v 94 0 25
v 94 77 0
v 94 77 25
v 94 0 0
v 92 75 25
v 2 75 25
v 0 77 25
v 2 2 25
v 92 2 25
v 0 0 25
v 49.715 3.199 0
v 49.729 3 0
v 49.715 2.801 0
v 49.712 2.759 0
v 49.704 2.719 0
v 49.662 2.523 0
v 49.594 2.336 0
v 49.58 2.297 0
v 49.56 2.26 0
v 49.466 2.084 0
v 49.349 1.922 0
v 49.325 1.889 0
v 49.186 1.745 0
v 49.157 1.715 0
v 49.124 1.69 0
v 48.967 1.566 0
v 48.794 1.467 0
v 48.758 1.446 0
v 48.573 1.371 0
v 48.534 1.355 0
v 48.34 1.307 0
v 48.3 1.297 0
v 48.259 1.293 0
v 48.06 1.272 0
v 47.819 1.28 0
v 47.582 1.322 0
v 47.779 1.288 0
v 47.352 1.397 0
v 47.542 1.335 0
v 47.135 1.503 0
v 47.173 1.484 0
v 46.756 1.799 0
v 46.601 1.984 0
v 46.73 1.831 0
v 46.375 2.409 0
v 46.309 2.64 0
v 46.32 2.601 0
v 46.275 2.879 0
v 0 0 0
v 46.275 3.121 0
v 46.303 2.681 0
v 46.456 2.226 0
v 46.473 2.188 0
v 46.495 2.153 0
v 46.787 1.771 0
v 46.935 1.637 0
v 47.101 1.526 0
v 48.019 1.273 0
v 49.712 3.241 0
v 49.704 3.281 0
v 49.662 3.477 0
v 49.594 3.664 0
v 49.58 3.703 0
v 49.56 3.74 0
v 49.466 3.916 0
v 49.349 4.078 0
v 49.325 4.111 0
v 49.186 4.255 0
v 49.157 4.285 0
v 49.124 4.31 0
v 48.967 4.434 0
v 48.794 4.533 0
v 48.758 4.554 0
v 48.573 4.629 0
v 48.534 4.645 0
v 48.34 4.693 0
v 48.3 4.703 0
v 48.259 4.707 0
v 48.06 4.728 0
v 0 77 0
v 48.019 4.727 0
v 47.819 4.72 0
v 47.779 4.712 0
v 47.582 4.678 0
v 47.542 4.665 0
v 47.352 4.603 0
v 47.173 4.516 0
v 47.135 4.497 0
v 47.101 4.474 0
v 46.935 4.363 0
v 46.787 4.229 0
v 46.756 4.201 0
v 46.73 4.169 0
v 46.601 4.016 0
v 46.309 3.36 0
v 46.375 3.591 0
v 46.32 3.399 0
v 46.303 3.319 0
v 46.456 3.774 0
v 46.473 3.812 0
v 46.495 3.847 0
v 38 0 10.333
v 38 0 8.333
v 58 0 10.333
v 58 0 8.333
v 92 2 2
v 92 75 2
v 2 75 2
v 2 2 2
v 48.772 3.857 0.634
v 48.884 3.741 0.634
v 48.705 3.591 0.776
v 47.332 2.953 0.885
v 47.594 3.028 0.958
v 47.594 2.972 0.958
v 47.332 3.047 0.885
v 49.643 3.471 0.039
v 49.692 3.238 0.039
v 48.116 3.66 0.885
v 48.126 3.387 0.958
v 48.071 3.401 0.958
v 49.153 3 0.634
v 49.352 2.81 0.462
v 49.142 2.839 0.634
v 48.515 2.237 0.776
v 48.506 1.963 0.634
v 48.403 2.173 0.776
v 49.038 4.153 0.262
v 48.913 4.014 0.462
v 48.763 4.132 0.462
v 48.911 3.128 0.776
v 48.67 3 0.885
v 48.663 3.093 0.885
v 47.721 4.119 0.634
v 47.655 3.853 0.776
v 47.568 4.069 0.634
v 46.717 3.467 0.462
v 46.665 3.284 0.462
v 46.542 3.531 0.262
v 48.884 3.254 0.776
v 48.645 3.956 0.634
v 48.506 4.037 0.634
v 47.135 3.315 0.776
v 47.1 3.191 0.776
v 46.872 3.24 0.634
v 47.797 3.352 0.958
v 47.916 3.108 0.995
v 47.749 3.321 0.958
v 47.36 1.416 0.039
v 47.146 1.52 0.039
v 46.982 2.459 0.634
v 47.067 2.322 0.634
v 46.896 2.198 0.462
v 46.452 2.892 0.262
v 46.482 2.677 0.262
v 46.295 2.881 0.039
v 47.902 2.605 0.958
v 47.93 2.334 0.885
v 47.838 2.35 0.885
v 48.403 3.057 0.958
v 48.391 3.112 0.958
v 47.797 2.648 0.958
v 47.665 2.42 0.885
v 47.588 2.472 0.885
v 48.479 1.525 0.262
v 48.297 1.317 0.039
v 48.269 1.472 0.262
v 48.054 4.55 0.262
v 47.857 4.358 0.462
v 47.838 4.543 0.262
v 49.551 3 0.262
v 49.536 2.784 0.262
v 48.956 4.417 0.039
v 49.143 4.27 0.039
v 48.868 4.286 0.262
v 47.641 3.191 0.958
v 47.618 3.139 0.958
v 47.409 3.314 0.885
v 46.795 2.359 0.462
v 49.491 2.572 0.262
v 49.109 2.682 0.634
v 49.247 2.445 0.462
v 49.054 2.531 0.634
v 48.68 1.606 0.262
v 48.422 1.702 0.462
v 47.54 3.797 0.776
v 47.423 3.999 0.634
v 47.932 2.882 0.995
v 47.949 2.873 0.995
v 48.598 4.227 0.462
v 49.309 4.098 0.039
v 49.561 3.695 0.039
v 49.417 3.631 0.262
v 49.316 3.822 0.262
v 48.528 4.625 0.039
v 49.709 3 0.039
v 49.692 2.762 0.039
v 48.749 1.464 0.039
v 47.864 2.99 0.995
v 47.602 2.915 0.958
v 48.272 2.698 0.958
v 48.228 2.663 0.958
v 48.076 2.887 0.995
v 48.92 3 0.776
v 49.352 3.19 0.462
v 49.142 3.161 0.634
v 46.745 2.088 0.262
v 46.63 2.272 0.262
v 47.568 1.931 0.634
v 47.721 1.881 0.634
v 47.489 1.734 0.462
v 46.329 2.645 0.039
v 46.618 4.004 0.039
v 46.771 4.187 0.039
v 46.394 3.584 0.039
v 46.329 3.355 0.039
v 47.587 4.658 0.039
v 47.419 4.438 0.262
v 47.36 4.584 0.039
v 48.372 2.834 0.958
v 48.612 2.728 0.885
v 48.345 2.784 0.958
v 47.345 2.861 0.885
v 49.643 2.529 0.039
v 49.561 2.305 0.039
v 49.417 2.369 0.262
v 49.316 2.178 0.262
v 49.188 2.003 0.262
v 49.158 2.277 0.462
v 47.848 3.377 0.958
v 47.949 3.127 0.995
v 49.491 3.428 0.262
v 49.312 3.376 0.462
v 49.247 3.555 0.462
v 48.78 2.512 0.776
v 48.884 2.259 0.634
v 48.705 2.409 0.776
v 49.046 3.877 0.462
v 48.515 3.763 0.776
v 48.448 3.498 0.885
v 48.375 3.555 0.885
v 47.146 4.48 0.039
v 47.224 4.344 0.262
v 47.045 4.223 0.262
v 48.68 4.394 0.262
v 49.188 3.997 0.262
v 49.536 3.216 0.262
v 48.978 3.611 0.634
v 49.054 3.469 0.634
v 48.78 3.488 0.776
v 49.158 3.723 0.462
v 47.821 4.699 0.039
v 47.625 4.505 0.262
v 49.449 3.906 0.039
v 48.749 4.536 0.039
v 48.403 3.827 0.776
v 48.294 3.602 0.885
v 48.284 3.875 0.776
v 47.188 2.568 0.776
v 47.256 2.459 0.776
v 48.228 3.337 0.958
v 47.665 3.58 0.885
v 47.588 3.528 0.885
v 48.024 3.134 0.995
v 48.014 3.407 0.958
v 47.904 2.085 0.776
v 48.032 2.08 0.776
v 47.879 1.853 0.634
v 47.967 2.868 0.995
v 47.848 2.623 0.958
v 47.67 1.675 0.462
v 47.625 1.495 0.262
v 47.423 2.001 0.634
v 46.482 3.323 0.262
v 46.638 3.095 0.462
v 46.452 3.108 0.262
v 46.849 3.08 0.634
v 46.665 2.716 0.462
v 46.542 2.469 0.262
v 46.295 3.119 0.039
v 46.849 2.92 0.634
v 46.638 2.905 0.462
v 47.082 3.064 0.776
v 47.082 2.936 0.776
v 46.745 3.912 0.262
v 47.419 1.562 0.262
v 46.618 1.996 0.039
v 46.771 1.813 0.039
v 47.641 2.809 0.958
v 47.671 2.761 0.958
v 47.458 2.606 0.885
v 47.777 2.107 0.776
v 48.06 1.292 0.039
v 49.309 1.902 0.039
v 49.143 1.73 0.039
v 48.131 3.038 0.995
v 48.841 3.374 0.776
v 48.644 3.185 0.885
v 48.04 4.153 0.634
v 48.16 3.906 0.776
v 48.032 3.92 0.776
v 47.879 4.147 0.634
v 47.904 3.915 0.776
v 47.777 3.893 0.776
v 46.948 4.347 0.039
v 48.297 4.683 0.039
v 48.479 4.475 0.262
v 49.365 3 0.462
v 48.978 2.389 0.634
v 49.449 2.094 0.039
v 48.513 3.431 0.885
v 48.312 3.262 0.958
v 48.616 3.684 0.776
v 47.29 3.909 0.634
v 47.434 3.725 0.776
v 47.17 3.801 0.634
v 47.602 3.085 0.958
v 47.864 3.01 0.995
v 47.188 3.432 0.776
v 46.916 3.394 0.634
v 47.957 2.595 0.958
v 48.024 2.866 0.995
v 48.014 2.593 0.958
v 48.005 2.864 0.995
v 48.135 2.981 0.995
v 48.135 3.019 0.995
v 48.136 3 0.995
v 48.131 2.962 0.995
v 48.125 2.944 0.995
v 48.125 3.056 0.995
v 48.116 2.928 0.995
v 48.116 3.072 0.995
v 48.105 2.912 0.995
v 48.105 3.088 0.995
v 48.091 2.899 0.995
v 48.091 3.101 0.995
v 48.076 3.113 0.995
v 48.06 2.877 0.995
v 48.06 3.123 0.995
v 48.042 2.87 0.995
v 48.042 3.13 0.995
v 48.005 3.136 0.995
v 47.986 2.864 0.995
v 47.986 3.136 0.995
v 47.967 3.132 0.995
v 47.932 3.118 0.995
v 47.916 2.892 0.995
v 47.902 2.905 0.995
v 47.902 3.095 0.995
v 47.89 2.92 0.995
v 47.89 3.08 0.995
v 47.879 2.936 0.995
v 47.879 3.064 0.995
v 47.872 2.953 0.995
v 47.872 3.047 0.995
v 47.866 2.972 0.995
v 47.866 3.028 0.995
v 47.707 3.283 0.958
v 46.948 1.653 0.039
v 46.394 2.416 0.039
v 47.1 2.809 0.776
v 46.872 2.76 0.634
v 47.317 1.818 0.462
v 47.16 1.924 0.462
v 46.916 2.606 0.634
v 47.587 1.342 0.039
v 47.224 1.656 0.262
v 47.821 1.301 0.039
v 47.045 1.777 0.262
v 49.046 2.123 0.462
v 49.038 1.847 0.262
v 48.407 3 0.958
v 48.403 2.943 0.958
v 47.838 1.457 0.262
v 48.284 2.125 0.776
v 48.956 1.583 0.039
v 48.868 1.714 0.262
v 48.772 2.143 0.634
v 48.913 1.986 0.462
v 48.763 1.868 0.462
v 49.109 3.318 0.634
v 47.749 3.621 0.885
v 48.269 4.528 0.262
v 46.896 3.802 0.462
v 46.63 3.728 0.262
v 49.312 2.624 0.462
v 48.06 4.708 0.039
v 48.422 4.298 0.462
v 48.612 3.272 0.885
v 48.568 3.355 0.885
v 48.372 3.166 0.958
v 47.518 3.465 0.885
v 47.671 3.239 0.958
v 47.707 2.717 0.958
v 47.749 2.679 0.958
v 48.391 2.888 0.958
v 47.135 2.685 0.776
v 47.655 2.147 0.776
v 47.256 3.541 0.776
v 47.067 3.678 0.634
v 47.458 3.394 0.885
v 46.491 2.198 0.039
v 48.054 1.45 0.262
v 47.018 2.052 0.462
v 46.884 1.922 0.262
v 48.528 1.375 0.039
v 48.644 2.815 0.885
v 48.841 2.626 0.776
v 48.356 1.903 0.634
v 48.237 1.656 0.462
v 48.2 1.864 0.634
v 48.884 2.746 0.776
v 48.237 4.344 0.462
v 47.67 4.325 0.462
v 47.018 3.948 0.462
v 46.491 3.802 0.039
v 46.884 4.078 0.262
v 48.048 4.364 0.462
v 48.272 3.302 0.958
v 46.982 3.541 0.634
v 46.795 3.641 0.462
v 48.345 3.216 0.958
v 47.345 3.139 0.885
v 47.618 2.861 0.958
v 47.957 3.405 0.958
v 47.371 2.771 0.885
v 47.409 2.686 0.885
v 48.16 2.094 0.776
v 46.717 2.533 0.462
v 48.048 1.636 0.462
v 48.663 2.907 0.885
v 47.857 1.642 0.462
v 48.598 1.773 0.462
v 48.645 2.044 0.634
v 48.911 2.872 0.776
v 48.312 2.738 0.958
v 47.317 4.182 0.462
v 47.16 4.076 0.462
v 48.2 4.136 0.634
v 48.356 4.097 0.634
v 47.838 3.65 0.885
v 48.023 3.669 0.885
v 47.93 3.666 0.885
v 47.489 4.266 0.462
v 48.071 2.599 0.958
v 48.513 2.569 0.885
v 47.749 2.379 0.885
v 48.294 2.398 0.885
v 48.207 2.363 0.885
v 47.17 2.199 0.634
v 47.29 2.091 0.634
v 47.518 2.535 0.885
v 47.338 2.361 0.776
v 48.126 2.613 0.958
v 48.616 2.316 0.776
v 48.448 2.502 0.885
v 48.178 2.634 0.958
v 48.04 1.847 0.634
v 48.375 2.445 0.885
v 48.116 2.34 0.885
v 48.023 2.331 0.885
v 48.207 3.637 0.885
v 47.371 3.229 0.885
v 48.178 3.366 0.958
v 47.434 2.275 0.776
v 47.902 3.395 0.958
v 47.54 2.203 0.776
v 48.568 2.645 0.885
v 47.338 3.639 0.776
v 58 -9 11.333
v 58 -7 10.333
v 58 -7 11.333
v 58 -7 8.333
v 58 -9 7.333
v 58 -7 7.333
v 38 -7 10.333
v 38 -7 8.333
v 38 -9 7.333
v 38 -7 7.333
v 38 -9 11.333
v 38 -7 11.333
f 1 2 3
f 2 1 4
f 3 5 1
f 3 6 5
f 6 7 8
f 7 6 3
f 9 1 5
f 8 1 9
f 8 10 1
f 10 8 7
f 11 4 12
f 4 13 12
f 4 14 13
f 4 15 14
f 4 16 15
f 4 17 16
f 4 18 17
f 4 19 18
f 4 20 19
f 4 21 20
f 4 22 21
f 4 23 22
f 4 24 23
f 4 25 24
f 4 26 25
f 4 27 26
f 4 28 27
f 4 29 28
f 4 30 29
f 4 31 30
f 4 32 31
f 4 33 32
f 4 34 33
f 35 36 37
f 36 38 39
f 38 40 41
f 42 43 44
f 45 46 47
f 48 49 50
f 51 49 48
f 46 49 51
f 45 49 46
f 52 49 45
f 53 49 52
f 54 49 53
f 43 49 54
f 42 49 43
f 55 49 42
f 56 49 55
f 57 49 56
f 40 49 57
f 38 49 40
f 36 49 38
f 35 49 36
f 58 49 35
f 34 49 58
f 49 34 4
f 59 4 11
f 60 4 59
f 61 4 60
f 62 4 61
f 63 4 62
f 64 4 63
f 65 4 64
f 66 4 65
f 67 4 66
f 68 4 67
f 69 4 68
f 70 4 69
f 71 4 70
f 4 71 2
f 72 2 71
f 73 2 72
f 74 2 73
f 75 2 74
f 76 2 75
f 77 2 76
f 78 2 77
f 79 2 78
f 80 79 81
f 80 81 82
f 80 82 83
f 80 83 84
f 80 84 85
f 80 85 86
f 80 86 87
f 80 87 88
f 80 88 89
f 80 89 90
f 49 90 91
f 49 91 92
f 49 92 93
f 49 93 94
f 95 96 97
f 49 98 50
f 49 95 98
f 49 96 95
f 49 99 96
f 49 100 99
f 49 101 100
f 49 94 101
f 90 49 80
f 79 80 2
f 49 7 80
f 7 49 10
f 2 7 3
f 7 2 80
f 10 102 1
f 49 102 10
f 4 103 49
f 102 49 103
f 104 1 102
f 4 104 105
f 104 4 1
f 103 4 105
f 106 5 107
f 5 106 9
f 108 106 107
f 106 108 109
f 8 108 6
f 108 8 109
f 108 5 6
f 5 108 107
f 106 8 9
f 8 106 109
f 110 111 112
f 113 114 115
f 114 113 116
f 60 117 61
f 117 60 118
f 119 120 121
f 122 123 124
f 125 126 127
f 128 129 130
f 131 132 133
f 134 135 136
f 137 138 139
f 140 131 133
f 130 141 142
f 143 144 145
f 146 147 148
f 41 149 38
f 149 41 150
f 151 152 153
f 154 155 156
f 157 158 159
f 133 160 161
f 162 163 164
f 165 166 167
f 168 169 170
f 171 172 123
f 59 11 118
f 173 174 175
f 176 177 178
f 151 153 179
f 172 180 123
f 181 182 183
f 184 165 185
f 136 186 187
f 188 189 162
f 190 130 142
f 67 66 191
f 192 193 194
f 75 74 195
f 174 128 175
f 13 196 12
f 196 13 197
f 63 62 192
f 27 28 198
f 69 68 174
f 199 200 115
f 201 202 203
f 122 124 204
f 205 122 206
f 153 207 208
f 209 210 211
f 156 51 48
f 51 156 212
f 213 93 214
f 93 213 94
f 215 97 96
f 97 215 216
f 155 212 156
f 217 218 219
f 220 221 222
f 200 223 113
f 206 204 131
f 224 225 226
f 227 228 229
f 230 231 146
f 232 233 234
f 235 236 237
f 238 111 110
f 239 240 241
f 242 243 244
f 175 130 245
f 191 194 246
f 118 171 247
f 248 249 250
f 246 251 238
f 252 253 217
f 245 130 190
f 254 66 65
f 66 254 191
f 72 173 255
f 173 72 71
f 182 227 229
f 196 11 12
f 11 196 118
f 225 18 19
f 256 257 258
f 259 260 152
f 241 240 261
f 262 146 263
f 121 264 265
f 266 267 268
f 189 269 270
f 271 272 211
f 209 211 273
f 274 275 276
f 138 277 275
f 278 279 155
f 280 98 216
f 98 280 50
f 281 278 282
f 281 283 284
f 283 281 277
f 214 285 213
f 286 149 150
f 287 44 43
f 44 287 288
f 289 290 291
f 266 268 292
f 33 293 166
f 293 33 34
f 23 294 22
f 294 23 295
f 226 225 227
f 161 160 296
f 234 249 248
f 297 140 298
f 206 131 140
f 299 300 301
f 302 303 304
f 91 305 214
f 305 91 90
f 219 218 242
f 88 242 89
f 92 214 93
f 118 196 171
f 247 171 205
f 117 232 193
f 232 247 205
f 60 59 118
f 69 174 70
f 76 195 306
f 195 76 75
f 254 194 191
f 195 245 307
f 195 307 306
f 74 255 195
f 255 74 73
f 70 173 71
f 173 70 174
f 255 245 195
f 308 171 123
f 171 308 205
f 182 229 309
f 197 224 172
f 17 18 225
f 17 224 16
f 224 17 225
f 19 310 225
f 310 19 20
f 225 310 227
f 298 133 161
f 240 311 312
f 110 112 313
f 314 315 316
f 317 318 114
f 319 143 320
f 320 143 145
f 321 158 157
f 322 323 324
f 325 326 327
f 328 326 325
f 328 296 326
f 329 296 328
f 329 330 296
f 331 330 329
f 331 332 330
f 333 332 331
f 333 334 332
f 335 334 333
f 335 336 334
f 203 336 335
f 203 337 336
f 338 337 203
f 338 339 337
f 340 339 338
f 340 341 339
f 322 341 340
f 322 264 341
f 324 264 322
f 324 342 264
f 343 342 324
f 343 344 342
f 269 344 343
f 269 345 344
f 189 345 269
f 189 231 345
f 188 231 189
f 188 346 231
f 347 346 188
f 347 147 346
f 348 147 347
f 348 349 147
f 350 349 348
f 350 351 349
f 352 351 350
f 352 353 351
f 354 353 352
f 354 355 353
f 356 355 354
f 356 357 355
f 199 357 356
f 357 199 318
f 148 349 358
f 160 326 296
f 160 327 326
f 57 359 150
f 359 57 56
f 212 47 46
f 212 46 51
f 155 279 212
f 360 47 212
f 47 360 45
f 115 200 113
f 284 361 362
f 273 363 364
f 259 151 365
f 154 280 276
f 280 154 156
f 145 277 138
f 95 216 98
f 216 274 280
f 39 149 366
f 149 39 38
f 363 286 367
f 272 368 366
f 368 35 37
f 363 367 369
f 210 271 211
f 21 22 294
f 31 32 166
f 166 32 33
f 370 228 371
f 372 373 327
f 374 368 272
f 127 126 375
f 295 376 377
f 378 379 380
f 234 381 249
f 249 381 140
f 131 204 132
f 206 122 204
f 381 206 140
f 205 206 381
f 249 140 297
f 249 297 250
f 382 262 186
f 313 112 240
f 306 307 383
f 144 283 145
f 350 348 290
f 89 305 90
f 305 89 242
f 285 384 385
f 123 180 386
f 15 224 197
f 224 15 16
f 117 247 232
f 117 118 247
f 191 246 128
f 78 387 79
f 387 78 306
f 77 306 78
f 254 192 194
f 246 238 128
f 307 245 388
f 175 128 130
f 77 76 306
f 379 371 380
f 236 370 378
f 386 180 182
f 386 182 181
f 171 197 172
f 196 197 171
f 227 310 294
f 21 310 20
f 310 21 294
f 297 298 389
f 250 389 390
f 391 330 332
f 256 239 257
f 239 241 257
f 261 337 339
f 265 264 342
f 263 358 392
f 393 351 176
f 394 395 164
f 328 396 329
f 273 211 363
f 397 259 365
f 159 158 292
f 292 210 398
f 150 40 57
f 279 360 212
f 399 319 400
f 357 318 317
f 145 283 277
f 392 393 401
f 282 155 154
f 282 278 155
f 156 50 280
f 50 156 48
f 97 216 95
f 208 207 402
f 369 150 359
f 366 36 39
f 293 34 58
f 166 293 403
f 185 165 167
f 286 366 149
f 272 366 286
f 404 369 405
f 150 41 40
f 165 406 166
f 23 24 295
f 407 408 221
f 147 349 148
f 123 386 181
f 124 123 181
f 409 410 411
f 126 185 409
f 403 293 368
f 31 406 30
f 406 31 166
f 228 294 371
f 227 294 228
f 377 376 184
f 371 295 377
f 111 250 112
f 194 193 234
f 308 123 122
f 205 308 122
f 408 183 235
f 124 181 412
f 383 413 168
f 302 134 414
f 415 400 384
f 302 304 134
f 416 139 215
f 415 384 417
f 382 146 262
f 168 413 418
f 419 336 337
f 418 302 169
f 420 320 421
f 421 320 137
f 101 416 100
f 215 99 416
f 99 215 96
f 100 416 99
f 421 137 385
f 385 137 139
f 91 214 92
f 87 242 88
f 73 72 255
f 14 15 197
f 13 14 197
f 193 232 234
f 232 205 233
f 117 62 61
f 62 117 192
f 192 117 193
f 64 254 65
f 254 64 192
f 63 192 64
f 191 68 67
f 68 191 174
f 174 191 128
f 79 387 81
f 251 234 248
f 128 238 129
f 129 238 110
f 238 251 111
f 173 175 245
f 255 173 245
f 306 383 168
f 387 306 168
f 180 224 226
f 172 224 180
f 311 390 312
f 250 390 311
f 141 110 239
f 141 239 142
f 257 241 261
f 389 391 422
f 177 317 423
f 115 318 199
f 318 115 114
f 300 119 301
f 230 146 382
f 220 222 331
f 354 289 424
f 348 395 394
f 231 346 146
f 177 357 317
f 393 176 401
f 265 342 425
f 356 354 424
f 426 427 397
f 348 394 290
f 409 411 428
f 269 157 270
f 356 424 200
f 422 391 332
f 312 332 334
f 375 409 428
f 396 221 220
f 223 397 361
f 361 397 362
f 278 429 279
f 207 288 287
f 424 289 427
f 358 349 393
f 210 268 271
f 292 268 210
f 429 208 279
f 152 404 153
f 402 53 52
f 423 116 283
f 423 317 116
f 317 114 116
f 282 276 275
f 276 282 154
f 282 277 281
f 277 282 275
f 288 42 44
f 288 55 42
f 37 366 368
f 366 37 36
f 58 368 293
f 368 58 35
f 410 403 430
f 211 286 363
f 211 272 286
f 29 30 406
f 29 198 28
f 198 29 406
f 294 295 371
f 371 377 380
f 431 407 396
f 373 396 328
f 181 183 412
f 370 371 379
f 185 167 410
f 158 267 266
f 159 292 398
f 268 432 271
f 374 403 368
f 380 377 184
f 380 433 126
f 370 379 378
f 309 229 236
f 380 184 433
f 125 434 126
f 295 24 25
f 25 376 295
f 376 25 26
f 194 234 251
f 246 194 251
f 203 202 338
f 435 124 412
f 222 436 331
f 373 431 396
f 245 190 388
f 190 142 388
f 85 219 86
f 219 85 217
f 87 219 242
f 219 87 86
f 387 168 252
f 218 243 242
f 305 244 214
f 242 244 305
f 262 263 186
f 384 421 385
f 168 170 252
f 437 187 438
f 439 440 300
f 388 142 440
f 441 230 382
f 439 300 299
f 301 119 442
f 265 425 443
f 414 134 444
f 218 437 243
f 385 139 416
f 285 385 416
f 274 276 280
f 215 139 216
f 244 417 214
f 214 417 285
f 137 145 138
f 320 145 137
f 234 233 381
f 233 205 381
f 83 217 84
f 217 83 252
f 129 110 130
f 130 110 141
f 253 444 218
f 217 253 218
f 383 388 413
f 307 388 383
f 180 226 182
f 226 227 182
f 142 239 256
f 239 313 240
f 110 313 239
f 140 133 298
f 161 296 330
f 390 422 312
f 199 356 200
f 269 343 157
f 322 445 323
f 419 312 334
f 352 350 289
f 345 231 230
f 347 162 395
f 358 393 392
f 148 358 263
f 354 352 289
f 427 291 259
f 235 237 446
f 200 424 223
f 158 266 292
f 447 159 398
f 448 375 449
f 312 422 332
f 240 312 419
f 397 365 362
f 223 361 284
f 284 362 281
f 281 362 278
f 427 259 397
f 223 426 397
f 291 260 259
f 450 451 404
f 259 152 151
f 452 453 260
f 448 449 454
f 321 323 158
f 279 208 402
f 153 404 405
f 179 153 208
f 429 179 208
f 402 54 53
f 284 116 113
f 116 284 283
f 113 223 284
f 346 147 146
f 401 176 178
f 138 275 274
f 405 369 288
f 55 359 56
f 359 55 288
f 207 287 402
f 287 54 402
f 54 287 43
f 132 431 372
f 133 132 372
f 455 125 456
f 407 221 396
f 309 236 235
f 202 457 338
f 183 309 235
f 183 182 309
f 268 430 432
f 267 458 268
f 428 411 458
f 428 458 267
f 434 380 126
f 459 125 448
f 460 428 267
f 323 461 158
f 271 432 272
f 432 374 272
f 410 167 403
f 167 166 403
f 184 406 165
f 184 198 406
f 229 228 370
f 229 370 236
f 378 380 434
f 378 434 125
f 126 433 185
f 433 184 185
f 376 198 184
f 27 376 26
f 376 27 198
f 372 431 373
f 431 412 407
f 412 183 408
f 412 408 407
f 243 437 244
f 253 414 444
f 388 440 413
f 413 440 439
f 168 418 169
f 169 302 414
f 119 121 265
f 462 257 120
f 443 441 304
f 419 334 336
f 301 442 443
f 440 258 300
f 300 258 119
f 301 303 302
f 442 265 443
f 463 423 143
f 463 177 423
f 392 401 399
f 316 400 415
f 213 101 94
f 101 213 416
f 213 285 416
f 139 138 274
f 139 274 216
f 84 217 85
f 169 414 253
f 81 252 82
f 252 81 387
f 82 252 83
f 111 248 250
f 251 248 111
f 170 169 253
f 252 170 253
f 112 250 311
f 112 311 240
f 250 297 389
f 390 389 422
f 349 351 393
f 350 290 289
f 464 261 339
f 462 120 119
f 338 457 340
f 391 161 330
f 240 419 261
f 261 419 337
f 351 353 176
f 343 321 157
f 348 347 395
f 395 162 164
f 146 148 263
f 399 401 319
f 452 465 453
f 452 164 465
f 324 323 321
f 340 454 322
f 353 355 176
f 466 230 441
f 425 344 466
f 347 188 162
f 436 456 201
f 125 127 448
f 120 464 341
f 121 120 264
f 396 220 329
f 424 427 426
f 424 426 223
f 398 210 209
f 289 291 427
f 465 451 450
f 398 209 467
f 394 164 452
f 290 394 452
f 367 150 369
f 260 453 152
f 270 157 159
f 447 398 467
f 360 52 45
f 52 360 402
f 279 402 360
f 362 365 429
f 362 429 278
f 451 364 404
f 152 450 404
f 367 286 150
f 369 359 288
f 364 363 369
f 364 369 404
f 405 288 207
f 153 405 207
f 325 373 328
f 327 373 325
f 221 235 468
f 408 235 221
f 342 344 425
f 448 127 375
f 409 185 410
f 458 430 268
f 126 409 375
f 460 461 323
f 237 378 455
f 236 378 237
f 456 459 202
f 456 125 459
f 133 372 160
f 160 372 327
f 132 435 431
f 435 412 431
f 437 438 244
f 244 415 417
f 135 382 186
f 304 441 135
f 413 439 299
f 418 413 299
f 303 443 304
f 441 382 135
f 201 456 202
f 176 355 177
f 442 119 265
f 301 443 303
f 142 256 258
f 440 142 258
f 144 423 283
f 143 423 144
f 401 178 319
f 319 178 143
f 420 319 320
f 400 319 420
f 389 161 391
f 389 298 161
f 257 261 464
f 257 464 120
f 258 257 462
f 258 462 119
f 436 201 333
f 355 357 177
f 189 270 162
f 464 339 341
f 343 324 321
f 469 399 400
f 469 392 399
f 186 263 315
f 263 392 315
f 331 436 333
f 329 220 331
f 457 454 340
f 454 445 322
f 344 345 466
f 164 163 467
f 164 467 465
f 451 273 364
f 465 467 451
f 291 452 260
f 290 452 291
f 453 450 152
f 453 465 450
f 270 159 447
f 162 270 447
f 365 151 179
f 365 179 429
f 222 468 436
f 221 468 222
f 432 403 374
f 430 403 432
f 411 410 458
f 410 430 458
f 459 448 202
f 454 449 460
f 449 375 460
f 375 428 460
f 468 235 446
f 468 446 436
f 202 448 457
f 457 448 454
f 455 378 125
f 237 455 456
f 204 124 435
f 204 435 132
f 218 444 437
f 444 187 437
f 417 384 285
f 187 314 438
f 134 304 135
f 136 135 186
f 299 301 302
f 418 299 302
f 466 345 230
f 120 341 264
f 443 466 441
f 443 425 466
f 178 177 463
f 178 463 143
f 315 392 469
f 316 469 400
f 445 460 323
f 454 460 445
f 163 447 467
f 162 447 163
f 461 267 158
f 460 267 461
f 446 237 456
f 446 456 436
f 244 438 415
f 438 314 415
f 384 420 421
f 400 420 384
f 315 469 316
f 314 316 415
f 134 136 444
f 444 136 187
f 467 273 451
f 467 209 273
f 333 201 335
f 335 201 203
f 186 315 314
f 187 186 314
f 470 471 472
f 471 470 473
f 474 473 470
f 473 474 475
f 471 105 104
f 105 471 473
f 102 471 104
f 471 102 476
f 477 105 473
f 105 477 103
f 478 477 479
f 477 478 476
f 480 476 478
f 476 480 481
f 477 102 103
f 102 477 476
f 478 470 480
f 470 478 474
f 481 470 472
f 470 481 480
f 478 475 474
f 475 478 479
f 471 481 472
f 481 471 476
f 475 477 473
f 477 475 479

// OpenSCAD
$fn = 45;

DRAWER_HEIGHT = 25;
CABINET_WIDTH = 100; // adjustable
CABINET_DEPTH = 80;  // adjustable

// drawer 1, no dividers
difference() {
    translate([0,0,0]) cube([CABINET_WIDTH - 6, CABINET_DEPTH - 3, DRAWER_HEIGHT]);
    translate([2,2,2]) cube([CABINET_WIDTH - 10, CABINET_DEPTH - 7, DRAWER_HEIGHT]);
    translate([(CABINET_WIDTH / 2) - 2, 3, -1]) sphere(2.0);
}


// pull handle
translate([(CABINET_WIDTH / 2) - 12,-9,(DRAWER_HEIGHT / 3)]) cube([20, 10, 2]);
translate([(CABINET_WIDTH / 2) - 12,-9,(DRAWER_HEIGHT / 3) -1]) cube([20, 2, 4]);
